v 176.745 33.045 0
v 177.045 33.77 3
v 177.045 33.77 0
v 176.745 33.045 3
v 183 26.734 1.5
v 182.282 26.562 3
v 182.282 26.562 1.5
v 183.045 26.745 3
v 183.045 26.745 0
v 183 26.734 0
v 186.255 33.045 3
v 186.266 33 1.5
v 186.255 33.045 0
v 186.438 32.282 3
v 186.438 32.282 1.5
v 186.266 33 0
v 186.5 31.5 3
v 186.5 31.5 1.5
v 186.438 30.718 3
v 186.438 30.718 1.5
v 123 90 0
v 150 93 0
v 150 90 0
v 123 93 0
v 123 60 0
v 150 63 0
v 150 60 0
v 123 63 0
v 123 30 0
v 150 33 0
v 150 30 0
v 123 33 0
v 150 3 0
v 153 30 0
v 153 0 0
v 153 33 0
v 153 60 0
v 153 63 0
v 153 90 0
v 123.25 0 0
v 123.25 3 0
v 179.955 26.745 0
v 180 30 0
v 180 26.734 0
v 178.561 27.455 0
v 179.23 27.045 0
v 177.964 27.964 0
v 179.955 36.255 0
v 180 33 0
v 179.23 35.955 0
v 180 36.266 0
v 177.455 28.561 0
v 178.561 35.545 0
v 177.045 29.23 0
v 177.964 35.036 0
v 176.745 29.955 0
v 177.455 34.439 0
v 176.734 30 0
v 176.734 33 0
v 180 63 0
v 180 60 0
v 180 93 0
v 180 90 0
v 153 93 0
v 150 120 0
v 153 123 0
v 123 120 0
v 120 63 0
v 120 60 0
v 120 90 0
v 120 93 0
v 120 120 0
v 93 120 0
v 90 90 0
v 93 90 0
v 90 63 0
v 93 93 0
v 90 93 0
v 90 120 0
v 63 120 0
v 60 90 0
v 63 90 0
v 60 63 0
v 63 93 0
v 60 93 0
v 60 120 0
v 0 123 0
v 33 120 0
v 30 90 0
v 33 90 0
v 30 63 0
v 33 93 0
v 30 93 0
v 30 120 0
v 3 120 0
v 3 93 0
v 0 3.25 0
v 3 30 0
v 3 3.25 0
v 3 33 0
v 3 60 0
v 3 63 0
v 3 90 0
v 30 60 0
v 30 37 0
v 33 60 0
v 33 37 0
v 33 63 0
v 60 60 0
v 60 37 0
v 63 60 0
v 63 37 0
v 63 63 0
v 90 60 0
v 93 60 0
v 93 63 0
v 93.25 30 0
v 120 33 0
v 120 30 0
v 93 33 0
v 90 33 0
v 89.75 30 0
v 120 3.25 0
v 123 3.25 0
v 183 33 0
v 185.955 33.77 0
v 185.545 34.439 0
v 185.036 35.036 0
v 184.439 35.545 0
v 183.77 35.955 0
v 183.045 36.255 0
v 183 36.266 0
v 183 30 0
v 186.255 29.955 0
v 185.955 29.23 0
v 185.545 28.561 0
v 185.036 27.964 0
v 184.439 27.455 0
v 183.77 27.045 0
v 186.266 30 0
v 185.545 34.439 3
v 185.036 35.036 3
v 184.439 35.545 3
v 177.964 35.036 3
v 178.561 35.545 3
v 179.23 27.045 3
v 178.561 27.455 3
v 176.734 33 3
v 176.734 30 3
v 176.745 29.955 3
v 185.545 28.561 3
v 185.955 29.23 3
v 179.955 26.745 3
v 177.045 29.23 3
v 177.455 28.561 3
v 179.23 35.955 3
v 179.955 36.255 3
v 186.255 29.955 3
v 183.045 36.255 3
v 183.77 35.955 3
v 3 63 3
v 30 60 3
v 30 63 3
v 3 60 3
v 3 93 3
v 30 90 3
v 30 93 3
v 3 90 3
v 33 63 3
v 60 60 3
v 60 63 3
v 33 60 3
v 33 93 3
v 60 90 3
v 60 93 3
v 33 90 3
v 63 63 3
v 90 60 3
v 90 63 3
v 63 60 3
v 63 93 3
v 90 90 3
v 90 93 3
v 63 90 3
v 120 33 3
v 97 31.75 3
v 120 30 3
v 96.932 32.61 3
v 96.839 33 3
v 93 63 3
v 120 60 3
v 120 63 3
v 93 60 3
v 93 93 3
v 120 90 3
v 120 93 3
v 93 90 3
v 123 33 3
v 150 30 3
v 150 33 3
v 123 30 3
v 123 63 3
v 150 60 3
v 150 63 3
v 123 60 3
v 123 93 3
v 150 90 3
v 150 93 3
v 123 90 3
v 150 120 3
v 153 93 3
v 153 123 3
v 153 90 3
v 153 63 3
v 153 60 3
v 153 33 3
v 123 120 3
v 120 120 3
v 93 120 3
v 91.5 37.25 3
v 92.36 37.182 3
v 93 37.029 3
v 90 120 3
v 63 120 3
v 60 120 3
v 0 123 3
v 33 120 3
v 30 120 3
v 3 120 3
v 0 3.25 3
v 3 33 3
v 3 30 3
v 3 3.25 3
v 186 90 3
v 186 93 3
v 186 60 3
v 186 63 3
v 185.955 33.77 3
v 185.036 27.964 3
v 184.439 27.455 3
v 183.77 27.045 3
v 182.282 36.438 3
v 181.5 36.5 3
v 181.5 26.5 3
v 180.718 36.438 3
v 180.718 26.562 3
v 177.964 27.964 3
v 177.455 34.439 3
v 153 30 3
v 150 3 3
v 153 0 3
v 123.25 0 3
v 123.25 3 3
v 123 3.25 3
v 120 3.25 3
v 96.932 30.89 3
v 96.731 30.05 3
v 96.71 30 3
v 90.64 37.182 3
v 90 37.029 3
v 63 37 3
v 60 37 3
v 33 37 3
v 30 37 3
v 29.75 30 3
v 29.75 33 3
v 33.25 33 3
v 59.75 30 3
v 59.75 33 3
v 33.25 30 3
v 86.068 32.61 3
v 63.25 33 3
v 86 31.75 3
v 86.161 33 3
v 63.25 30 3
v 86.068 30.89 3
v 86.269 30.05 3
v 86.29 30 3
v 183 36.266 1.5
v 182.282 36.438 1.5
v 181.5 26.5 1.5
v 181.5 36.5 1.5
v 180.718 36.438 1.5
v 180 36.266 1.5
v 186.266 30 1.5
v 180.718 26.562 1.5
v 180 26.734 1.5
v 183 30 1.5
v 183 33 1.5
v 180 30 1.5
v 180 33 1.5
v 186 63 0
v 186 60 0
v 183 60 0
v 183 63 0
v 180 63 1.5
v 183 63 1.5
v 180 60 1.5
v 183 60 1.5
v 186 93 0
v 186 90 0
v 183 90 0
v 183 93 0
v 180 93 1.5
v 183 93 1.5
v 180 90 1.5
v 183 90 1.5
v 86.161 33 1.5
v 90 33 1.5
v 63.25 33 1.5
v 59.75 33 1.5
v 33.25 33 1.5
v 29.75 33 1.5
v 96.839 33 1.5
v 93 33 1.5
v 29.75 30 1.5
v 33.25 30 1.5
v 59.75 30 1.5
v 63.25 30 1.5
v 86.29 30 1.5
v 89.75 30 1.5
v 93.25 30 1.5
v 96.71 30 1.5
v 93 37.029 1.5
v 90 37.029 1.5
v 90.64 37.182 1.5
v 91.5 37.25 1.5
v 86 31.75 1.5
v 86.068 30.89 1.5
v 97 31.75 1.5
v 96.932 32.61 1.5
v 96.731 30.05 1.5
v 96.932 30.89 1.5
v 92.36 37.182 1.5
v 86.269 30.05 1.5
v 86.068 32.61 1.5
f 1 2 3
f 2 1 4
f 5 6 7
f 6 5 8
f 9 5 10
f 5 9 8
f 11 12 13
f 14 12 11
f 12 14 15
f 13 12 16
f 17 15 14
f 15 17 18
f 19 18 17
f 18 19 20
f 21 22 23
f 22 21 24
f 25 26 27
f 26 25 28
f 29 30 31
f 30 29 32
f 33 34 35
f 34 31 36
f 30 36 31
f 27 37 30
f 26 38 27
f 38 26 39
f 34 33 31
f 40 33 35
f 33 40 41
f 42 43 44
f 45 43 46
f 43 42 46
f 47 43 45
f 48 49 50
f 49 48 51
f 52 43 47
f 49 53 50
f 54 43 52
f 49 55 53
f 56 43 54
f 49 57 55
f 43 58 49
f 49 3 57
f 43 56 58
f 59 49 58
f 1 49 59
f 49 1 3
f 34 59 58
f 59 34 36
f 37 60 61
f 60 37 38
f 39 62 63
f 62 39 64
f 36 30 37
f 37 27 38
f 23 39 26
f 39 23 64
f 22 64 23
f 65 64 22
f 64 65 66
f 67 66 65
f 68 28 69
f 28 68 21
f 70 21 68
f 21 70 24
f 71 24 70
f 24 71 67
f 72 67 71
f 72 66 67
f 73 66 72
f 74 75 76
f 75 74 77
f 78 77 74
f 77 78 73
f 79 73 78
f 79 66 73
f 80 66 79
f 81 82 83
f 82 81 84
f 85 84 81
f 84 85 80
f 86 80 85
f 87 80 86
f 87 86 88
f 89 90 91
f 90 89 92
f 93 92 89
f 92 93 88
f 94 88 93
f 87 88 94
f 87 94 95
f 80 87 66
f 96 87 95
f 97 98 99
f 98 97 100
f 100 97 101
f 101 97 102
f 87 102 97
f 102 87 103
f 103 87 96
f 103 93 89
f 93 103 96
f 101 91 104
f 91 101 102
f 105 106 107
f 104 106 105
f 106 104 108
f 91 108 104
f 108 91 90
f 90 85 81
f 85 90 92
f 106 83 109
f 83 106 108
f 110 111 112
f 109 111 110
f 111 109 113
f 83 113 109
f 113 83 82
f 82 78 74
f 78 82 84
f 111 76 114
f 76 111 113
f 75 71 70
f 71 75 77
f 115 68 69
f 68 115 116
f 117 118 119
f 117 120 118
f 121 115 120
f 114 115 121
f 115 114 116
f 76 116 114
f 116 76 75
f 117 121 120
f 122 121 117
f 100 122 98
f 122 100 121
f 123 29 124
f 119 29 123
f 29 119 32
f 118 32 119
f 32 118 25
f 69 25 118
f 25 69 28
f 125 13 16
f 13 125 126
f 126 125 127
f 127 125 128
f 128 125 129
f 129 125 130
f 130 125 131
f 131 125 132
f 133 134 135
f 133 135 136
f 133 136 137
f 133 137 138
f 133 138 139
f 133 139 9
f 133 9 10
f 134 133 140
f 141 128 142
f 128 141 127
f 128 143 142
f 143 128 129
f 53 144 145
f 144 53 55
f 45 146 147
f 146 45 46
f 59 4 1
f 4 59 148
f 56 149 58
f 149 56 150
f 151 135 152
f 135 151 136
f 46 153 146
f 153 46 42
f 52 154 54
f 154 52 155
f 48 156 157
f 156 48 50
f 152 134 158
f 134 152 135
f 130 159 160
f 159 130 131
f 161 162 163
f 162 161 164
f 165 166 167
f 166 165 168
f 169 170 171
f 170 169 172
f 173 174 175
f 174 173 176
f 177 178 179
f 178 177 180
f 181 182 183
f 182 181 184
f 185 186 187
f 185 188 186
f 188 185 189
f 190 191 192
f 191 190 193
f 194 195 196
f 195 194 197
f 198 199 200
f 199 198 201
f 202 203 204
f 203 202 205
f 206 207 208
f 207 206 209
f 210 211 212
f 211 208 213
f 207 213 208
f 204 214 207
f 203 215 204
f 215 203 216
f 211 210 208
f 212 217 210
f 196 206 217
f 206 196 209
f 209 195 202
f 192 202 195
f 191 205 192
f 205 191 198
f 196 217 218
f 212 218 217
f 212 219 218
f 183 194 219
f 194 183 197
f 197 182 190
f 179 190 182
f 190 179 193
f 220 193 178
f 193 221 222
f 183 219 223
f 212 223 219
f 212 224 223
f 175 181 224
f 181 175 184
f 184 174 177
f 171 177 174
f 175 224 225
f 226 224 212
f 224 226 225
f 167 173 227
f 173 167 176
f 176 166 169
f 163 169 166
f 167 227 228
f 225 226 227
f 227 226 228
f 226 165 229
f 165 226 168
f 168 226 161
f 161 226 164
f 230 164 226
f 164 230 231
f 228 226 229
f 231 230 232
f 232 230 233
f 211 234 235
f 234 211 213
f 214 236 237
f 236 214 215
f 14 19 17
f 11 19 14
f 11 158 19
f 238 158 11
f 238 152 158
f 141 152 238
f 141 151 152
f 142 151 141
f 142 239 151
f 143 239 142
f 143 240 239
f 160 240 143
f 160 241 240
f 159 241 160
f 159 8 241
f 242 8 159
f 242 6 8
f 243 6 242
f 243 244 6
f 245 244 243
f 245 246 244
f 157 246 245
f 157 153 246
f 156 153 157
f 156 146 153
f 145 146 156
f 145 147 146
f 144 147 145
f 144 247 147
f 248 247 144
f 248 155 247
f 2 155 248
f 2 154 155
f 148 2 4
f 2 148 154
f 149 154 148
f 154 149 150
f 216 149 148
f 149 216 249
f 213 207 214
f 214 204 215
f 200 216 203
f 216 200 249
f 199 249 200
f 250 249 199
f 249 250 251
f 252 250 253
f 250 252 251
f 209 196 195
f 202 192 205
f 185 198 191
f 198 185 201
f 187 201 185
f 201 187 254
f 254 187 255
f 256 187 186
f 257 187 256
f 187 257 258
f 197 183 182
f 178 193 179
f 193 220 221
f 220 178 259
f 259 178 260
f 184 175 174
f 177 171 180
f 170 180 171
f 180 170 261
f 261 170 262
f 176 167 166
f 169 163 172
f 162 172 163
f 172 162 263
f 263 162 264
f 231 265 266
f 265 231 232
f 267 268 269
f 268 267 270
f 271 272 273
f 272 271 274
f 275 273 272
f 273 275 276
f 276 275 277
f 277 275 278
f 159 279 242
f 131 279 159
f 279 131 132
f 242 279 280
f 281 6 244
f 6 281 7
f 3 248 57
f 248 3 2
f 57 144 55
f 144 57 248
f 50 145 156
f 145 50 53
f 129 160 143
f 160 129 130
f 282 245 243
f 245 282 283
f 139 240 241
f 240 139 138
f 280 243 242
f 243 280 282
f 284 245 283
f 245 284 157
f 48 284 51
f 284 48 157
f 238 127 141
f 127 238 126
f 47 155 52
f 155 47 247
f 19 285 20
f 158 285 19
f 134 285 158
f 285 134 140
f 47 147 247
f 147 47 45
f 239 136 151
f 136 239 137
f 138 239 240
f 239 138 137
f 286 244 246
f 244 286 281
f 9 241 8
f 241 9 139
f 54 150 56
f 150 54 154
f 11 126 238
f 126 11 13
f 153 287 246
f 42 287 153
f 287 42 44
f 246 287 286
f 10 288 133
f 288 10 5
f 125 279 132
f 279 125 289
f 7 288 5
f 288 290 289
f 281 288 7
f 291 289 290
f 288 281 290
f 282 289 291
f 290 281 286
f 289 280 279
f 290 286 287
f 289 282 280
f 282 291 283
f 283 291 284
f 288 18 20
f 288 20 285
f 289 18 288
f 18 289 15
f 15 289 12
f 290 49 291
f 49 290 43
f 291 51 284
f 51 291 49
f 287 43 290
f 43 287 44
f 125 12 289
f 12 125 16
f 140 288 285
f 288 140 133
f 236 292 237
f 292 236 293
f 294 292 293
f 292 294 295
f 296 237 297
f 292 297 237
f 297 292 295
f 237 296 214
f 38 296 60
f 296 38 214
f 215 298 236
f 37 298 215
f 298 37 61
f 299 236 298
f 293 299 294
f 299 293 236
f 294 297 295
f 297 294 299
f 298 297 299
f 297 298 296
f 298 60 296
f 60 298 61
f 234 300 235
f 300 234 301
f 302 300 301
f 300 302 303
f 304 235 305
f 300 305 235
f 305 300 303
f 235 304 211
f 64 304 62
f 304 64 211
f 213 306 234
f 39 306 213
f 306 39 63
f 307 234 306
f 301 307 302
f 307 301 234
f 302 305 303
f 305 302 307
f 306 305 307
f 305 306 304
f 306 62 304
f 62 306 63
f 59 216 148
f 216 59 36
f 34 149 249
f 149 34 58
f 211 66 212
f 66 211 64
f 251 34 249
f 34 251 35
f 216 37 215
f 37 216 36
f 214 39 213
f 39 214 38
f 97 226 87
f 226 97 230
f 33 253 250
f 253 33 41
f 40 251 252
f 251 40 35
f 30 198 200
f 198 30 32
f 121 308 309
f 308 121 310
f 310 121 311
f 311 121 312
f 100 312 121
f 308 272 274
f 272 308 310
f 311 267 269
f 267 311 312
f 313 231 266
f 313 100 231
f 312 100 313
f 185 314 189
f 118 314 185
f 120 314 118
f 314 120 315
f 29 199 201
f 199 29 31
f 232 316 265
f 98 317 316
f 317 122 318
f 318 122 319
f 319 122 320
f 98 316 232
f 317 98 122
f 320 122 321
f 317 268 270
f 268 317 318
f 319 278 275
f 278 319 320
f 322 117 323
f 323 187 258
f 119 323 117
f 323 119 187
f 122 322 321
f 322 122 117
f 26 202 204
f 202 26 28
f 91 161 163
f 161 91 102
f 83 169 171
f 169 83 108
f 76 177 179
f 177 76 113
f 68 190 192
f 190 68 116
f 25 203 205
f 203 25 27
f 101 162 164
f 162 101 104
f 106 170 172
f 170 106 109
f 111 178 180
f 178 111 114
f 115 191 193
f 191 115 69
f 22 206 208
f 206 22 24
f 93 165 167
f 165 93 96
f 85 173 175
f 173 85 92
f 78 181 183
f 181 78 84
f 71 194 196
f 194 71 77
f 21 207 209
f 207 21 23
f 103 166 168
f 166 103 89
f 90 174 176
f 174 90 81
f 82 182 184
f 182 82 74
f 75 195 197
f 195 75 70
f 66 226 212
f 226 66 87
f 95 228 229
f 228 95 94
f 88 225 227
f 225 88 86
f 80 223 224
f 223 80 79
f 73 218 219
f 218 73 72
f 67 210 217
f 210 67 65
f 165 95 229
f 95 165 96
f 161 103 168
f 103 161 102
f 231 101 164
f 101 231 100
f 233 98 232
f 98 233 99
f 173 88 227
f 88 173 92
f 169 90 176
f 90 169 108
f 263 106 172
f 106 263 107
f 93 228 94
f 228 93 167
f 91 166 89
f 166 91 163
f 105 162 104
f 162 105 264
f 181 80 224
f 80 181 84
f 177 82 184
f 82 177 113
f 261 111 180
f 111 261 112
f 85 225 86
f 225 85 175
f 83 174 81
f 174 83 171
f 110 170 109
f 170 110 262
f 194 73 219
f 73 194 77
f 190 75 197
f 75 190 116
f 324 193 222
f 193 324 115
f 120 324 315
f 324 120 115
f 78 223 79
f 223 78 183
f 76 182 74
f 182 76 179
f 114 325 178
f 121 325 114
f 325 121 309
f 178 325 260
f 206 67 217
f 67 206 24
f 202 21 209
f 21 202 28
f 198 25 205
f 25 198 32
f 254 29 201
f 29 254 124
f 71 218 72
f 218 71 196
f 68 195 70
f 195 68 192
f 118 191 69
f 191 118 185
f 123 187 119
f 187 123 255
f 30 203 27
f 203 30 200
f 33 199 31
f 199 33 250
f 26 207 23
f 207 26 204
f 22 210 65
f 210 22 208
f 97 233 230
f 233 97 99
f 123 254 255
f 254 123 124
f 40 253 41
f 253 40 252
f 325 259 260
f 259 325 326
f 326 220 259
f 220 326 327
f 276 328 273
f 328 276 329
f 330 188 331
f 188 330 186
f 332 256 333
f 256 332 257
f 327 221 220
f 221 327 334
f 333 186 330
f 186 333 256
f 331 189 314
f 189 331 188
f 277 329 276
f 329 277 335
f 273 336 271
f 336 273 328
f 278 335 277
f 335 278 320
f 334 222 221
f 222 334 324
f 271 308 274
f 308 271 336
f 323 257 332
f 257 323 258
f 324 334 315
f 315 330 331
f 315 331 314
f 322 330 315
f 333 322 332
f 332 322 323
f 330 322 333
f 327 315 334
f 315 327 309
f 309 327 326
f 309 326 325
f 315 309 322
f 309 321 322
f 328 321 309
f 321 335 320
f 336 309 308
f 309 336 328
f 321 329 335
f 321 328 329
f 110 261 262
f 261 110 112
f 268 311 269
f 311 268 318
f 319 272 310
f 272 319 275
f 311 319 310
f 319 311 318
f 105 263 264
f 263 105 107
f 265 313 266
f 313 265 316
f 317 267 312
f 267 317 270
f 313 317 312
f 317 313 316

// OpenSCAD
size = 30;
width = 3;
dot_size = 5;
clearance = 0.5;

$fn = 40;

interface(size, width, dot_size, 0);
difference(){
    board_piece(size, width, dot_size);
    translate([4*size+width+clearance/2, -5*size-clearance/2, -clearance/2]) rotate([0,0,90])  board_piece(size, width+clearance, dot_size);
    translate([4*size+width+clearance/2, -5*size, -clearance/2]) rotate([0,0,90])  interface(size, width+clearance, dot_size+clearance, clearance);
}
module board_piece(size, width, dot_size) {
for (i = [0:4])
    translate([0, i*size, 0]) cube([5*size+width, width, width]);

for (i = [0:5])
    translate([i*size, 0, 0]) cube([width, 4*size+width, width]);
}

module interface(size, width, dot_size, trim) {
difference(){
    translate([6*size+width/2, size+width/2, 0]) cylinder(  width,   dot_size, dot_size,false);
    
    translate([6*size, size-width*2, 0]) cube([width, width*5, width/2]);
    translate([6*size, size, 0]) cube([width*3, width, width/2]);
}

translate([5*size, size, 0]) cube([size, width, width]);


for (i=[2:3])
    translate([5*size, size*i, 0]) {
        difference(){
            cube([size+width*2, width, width]);
            #translate([size, 0, 0]) cube([width-trim, width, width/2]);
        }
    }   
}
